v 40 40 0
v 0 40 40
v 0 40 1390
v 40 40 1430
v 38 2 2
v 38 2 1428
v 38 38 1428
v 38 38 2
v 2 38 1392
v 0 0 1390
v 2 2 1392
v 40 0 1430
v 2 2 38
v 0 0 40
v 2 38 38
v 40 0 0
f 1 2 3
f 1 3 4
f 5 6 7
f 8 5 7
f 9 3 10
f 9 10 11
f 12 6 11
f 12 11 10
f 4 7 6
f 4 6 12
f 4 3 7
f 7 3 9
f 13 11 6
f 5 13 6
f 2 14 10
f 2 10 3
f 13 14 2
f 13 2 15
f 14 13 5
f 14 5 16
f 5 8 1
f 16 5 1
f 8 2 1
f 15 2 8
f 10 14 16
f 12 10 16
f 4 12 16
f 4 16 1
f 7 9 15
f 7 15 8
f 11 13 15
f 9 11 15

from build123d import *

# Parameters (mm, degrees)
F0_W        = 40
F0_H        = 40
F0_W_2      = 36
F0_H_2      = 36
F1_DEPTH    = 1430
F2_T1_DEPTH = 245.7346390373


# Not quite as in the source:
# - a fillet or chamfer that OpenCascade refuses, or shapes differently, is made with other operations: its cross-section is extruded or revolved along the edge and cut away or added


with BuildPart() as f1:
    # F0 (on Top) → F1 (new body)
    with BuildSketch(Plane.XY):
        with Locations((20, 20)):
            Rectangle(F0_W, F0_H)
        with Locations((20, 20)):
            Rectangle(F0_W_2, F0_H_2, mode=Mode.SUBTRACT)
    extrude(amount=F1_DEPTH)

    # F2: chamfer of 40 on 2 edges, made by hand

    # F2_s2 → F2_t1 (cut)
    with BuildSketch(Plane.XZ.offset(-142.8673195186)):
        Polygon((0, 40), (40, 0), (0, 0), align=None)
        Polygon((0, 1390), (40, 1430), (0, 1430), align=None)
    extrude(amount=F2_T1_DEPTH, mode=Mode.SUBTRACT)


solid = f1.part
